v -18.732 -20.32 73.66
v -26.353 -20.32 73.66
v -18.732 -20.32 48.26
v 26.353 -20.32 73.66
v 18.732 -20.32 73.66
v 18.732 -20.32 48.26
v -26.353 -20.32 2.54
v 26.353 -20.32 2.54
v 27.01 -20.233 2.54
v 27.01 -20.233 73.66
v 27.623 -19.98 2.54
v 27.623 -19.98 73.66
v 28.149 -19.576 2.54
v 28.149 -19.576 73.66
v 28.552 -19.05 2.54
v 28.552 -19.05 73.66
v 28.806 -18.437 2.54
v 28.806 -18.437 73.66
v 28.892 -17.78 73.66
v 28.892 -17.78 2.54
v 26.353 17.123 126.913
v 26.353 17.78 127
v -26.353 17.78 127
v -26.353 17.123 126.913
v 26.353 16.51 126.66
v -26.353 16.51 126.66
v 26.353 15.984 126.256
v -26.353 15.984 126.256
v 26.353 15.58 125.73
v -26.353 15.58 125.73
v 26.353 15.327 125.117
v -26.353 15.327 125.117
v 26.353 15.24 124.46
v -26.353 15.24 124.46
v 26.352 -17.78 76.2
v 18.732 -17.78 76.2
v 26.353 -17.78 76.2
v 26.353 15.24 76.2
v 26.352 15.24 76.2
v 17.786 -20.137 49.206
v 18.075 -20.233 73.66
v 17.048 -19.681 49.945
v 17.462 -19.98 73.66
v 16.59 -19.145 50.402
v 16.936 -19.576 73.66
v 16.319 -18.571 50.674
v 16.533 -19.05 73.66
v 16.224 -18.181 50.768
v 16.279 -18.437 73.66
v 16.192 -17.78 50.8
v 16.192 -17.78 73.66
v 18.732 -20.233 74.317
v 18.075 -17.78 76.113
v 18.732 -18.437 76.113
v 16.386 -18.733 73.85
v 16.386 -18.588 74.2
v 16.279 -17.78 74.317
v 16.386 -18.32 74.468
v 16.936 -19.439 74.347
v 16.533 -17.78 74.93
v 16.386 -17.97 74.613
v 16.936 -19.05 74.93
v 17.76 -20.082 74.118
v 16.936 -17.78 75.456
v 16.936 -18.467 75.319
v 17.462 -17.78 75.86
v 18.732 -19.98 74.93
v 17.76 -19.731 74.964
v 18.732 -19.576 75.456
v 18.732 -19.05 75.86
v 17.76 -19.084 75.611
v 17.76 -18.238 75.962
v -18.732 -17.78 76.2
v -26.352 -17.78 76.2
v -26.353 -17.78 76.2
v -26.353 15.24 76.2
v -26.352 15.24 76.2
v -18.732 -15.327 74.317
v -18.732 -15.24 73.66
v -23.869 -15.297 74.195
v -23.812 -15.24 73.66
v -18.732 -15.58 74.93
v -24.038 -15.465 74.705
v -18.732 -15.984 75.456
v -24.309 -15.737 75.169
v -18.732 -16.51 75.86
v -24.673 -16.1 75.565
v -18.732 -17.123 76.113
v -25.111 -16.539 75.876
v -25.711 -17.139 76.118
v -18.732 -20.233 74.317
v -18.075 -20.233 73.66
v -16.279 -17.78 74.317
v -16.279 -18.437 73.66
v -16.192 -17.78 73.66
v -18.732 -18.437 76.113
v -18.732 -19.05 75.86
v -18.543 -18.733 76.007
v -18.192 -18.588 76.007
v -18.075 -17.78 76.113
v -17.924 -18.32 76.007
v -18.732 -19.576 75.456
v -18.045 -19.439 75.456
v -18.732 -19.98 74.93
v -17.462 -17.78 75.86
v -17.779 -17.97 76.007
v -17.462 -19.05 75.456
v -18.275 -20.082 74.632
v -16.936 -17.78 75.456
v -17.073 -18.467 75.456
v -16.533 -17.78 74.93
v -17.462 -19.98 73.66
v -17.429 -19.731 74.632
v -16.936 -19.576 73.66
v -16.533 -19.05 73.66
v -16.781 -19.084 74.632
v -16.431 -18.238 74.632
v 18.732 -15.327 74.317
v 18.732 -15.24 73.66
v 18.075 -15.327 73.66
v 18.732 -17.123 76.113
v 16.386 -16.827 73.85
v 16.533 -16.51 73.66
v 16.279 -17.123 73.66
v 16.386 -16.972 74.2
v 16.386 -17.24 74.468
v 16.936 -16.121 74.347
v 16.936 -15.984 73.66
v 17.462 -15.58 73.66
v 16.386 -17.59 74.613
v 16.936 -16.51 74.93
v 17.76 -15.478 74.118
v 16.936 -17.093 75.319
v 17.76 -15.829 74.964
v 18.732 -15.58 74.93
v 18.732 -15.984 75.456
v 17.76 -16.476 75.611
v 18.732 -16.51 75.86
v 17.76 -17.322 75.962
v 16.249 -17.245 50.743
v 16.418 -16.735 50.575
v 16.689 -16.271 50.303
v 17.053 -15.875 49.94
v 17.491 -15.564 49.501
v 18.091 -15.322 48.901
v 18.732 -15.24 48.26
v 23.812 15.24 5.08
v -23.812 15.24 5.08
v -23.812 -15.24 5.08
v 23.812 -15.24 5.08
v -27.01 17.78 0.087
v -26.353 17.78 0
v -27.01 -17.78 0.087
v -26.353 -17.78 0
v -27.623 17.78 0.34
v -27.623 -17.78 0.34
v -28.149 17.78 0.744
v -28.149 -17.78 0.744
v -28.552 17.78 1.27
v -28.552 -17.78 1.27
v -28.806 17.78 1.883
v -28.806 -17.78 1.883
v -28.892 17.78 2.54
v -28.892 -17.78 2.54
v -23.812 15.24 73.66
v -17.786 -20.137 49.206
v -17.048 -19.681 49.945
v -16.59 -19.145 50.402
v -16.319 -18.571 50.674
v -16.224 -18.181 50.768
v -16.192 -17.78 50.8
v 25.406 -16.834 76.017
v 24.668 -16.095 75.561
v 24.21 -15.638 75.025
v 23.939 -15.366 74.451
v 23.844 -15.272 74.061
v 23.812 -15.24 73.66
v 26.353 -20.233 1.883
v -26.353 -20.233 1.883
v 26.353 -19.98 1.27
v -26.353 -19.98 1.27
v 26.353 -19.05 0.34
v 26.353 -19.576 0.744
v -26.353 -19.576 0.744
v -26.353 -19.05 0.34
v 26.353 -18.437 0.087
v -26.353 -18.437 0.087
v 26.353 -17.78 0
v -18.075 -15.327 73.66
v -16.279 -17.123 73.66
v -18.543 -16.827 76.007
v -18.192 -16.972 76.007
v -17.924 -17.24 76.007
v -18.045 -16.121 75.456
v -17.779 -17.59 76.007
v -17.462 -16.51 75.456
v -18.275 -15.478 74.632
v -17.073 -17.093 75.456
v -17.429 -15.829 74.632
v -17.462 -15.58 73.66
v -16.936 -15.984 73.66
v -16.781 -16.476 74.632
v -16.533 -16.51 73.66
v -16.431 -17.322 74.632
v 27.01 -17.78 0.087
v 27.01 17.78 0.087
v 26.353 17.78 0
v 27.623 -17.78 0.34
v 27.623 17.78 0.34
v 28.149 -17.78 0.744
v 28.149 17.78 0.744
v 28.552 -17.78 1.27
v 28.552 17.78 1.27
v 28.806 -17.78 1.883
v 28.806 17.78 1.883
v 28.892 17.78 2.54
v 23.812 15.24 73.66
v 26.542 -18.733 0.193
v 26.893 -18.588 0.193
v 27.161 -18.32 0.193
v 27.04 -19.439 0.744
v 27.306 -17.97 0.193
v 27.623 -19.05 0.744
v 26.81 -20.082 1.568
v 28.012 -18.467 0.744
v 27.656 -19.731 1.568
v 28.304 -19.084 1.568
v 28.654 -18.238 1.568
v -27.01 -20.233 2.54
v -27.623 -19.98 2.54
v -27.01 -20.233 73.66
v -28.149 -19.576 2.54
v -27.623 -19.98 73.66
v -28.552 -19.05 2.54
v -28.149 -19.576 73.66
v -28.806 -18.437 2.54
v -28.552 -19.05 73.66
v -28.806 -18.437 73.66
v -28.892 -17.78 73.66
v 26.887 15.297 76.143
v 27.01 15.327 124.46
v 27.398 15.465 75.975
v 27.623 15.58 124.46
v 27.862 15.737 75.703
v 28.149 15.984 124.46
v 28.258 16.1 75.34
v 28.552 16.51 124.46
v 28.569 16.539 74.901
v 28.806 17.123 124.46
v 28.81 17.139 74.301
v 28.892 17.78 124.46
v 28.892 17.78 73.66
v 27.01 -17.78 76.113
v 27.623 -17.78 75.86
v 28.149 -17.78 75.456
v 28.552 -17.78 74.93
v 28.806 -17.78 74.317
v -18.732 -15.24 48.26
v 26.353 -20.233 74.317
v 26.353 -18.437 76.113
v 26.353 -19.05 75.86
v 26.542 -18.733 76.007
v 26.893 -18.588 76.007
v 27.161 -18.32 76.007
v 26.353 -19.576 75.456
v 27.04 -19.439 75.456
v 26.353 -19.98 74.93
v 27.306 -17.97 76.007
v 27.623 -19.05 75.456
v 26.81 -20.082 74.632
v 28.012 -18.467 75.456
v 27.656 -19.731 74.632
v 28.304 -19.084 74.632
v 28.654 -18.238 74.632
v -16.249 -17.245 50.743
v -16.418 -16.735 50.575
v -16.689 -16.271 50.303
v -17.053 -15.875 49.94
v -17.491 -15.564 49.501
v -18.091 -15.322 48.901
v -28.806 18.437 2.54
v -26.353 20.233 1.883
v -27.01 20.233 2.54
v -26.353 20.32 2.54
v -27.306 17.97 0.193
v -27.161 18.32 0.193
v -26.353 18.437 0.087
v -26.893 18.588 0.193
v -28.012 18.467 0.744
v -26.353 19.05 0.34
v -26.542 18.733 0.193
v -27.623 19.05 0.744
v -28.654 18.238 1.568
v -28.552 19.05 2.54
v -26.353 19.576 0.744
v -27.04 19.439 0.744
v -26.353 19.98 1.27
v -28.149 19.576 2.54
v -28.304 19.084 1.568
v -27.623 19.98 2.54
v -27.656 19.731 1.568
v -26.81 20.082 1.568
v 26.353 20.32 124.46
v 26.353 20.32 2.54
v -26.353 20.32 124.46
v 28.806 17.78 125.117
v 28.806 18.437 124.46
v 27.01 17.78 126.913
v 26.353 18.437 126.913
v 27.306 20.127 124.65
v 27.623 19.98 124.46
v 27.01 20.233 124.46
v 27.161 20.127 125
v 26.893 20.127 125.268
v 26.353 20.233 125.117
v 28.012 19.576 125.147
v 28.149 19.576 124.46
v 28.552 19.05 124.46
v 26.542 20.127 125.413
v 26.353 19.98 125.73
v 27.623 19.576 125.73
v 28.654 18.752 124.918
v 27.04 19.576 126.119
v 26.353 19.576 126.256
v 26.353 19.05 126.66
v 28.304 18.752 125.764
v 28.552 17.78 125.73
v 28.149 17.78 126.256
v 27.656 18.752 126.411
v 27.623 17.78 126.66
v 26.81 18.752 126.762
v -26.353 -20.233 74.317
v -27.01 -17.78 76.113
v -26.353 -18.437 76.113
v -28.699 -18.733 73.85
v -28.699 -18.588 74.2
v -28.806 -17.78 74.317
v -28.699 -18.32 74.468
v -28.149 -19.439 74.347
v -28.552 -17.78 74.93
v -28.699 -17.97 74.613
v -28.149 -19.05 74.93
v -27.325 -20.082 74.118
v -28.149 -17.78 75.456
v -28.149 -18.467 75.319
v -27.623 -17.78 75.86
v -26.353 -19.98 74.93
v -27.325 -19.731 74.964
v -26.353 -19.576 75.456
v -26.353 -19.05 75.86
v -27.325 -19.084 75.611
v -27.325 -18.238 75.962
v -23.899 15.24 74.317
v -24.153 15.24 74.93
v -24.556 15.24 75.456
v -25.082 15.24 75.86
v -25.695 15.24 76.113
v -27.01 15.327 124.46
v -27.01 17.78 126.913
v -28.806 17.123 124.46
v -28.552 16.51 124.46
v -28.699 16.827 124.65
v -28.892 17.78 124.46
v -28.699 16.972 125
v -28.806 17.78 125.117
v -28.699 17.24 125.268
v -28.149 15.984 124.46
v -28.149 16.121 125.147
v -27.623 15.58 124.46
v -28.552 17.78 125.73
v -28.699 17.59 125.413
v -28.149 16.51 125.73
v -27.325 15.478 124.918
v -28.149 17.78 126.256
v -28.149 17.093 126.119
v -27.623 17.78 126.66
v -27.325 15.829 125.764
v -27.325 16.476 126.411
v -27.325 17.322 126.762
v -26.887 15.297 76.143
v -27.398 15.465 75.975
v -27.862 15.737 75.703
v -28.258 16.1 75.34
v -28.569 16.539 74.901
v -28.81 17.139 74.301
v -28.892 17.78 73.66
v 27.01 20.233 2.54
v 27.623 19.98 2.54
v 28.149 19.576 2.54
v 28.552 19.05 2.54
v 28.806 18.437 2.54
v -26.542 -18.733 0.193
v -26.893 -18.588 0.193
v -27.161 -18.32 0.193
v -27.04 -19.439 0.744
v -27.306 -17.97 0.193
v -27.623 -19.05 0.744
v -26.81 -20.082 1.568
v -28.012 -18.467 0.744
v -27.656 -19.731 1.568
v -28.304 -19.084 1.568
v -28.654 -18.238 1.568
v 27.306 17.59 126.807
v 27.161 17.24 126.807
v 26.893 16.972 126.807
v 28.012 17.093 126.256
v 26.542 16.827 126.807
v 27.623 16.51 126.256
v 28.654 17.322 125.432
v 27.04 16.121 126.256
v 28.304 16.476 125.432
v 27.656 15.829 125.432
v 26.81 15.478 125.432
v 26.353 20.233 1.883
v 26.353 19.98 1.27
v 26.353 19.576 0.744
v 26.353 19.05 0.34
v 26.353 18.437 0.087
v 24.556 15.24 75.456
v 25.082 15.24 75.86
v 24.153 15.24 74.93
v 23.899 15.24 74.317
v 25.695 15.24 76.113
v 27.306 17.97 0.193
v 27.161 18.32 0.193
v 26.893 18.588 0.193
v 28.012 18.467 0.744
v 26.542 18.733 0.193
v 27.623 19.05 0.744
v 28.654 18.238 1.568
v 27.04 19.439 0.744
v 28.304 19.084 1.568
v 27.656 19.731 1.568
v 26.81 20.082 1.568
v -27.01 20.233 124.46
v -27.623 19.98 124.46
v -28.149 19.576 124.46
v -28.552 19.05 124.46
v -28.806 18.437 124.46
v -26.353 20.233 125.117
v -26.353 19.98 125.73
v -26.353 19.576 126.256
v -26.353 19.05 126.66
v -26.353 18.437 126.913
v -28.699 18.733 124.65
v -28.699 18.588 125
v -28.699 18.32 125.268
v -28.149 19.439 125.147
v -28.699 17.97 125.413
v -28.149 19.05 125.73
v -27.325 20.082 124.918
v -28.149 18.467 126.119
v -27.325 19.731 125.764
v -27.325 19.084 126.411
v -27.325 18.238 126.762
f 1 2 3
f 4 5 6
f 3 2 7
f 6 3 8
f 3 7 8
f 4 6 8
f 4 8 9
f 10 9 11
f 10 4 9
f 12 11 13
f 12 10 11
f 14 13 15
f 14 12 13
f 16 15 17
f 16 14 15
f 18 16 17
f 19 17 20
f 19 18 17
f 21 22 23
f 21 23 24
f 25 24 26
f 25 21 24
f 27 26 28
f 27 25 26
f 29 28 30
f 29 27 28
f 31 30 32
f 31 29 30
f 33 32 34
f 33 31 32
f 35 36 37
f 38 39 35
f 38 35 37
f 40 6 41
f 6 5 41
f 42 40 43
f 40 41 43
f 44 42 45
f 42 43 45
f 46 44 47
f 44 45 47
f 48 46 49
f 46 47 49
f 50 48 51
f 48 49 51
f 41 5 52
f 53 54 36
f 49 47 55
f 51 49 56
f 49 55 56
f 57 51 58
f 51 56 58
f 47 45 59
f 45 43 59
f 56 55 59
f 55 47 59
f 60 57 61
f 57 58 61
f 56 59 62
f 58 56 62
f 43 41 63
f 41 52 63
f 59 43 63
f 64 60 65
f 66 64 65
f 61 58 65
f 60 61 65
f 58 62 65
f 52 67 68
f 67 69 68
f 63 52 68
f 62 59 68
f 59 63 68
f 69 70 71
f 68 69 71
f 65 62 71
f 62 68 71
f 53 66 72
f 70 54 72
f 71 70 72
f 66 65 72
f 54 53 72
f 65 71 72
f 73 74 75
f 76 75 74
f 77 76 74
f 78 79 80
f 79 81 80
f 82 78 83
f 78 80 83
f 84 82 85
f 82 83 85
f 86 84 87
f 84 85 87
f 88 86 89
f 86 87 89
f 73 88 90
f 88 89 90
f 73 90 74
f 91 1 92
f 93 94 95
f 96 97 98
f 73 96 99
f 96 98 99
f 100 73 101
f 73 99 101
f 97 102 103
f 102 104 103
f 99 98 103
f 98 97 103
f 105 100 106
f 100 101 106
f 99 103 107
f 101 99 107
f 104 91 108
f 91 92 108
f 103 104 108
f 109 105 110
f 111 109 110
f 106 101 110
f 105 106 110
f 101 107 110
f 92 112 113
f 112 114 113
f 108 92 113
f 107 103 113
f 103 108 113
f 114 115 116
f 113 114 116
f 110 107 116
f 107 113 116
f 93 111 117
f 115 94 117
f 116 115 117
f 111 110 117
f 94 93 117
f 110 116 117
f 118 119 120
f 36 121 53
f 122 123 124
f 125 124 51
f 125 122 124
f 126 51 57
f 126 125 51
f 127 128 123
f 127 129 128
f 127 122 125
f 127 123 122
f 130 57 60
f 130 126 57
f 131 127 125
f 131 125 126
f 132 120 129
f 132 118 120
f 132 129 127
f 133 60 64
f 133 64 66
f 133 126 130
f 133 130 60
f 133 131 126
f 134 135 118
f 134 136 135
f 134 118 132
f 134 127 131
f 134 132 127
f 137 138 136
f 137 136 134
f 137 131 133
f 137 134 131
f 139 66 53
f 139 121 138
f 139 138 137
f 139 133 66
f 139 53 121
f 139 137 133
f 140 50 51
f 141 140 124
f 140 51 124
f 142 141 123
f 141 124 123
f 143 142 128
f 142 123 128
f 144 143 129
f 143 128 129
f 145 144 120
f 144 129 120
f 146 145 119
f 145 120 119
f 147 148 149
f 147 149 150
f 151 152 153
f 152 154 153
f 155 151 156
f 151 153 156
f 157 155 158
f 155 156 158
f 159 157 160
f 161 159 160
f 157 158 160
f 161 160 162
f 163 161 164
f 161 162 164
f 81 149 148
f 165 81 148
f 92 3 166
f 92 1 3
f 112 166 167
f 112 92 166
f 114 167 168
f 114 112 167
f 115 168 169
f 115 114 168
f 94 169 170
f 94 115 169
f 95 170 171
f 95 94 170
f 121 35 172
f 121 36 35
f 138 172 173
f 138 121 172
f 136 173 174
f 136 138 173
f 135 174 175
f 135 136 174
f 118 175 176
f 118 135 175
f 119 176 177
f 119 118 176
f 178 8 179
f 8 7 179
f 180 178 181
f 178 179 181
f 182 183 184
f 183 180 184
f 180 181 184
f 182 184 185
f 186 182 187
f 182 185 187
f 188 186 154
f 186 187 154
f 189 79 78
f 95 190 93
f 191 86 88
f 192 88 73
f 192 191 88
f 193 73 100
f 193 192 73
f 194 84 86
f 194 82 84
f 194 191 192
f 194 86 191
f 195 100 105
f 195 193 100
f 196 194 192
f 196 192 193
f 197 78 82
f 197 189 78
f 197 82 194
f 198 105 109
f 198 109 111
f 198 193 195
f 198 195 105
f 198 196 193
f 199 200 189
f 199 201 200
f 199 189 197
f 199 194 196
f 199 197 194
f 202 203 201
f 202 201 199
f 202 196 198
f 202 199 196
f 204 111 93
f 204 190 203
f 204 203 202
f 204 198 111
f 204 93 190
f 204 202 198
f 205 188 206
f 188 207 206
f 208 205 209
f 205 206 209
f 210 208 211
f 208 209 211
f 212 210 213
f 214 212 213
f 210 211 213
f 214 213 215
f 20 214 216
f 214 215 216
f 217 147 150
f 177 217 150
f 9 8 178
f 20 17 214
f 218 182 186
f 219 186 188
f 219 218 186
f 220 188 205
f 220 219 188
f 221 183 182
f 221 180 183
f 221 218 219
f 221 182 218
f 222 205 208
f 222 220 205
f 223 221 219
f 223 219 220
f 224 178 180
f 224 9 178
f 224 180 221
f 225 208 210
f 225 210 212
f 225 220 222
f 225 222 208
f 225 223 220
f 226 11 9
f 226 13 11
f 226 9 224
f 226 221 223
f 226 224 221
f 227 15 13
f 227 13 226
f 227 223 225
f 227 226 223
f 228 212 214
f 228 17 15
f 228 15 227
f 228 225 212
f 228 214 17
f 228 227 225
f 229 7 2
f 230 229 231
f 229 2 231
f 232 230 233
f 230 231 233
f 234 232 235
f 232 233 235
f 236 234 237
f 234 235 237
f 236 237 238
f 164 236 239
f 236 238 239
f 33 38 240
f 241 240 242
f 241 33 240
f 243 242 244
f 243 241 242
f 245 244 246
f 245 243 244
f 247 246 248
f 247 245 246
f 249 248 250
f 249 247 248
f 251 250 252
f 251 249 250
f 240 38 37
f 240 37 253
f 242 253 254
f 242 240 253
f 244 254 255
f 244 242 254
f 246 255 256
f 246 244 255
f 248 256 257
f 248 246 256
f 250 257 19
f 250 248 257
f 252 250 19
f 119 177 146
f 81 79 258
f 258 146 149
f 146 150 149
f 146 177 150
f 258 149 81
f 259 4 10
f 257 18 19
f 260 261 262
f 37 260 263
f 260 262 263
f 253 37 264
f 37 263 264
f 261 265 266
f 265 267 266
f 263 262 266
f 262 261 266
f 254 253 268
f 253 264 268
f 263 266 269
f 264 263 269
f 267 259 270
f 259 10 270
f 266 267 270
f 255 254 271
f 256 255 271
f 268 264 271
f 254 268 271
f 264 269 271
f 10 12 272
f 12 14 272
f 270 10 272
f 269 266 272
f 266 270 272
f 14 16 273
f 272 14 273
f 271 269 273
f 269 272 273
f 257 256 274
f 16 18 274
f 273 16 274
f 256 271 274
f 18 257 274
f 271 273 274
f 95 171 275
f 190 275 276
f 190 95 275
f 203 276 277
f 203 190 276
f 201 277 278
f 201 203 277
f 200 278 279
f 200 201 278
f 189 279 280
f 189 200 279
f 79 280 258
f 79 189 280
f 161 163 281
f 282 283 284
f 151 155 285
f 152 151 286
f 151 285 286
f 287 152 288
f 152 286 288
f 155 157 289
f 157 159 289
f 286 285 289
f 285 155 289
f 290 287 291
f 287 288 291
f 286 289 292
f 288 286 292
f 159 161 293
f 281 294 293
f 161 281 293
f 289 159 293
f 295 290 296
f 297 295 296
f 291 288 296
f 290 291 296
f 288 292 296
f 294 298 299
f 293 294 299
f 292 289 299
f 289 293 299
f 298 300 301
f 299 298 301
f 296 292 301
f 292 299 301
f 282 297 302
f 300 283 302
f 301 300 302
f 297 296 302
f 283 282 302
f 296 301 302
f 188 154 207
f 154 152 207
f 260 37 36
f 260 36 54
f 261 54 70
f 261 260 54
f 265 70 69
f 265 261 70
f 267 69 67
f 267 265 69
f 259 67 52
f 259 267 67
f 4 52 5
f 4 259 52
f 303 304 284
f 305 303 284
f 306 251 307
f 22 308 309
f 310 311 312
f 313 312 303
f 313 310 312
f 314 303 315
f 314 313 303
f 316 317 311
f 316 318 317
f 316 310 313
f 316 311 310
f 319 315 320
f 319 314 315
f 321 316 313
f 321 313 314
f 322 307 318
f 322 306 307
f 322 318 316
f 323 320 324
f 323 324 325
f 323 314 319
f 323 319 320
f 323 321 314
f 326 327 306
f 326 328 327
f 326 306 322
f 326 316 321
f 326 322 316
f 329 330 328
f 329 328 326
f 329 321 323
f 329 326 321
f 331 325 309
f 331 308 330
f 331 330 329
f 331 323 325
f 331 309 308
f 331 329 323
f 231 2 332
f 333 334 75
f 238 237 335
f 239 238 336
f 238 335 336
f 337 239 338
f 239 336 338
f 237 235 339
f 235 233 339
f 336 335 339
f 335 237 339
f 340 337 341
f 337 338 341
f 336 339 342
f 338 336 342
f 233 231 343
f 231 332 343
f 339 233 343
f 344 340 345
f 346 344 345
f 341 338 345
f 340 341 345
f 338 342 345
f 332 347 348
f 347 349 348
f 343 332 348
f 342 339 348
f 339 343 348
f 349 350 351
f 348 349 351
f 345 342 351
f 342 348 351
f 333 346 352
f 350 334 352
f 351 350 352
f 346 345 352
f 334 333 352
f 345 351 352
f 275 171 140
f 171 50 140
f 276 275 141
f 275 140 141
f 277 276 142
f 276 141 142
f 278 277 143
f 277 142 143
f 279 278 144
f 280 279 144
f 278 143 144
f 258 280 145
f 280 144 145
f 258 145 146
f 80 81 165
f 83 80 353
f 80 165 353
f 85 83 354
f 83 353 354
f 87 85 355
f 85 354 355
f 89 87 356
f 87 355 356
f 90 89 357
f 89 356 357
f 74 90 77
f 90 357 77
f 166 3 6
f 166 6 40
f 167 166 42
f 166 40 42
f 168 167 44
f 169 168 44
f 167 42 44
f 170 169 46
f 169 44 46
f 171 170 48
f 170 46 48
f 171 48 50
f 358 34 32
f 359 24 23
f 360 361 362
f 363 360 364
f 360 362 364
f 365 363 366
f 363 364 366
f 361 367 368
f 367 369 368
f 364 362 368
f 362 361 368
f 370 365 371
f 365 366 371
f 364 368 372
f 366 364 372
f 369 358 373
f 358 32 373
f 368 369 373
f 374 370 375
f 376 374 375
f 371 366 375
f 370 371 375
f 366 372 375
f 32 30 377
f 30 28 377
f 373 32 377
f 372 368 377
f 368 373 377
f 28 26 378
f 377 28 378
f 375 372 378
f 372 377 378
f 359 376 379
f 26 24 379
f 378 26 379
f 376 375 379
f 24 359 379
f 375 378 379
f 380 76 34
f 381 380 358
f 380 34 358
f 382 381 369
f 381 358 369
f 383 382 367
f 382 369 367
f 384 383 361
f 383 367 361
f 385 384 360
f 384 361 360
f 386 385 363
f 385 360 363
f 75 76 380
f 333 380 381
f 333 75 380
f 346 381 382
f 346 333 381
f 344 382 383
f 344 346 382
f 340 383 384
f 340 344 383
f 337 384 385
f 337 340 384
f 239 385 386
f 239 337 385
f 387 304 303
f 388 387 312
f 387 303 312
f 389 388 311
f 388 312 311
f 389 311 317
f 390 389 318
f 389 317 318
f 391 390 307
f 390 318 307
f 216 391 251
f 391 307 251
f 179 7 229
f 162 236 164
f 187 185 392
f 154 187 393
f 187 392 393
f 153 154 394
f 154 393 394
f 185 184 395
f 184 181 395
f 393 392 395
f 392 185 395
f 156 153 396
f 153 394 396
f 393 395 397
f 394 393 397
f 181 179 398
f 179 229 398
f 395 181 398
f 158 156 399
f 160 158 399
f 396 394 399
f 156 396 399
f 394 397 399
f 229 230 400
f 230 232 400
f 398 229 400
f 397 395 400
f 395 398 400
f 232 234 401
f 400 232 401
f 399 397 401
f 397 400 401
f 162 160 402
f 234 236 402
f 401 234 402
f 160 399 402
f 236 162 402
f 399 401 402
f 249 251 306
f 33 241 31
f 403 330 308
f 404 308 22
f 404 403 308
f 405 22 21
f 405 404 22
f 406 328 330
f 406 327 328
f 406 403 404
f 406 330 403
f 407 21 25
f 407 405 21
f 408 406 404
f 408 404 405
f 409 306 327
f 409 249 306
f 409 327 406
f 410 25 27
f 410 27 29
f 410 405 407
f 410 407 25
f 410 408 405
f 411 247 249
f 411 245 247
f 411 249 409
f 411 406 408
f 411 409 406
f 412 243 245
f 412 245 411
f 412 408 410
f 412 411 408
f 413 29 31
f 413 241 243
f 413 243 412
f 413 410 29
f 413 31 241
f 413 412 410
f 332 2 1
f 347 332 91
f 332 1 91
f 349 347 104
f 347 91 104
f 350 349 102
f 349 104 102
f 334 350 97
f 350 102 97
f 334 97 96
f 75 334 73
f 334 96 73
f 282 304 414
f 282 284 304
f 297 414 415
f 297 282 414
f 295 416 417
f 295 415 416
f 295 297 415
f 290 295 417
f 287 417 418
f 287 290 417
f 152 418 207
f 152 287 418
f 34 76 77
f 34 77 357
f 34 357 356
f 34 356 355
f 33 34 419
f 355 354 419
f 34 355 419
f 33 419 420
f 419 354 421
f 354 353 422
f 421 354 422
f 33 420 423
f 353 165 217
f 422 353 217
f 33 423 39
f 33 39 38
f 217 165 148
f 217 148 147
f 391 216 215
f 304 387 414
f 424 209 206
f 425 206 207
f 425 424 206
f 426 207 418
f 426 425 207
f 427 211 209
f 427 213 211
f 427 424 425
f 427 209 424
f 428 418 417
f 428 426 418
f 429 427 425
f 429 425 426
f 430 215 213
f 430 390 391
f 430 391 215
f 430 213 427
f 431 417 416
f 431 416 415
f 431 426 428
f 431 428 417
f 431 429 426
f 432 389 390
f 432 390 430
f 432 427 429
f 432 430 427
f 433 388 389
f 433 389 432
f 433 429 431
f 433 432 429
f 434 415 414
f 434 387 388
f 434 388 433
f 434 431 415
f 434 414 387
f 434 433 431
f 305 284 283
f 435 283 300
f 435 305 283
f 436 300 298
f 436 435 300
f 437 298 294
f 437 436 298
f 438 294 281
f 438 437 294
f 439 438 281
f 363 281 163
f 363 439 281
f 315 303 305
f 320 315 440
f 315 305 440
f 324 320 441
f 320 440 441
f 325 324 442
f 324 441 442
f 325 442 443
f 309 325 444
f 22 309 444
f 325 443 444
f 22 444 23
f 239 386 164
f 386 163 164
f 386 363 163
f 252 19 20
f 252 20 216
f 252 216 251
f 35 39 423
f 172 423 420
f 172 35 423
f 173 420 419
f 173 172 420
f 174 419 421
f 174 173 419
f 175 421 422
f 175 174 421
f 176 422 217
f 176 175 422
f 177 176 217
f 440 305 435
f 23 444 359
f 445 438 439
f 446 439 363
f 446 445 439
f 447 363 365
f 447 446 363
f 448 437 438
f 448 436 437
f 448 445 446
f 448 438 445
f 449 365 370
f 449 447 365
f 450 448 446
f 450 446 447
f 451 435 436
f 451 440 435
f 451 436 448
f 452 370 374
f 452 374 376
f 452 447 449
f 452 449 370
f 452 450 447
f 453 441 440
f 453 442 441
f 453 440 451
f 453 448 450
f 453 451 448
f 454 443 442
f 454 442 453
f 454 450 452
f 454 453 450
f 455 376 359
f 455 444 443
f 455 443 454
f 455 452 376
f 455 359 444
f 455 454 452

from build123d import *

# Parameters (mm, degrees)
F1_DEPTH = 5.08
F0_W     = 32.385
F0_H     = 5.08
F2_DEPTH = 50.8
F3_DEPTH = 76.2
F4_DEPTH = 127
F5_R     = 2.53999


# Not quite as in the source:
# - a fillet or chamfer is up to 0.001 mm smaller than in the source, because OpenCascade refuses the exact size


with BuildPart() as f1:
    # F0 (on Top) → F1 (new body)
    with BuildSketch(Plane.XY):
        Polygon((23.8125, 15.24), (-23.8125, 15.24), (-23.8125, -15.24), (-16.1925, -15.24), (16.1925, -15.24), (23.8125, -15.24), align=None)
    extrude(amount=F1_DEPTH)

    # F0 (on Top) → F2 (join)
    with BuildSketch(Plane.XY):
        with Locations((0, -17.78)):
            Rectangle(F0_W, F0_H)
    extrude(amount=F2_DEPTH)

    # F0 (on Top) → F3 (join)
    with BuildSketch(Plane.XY):
        Polygon((-23.8125, 15.24), (-28.8925, 15.24), (-28.8925, -20.32), (-16.1925, -20.32), (-16.1925, -15.24), (-23.8125, -15.24), align=None)
        Polygon((28.8925, -20.32), (28.8925, 15.24), (23.8125, 15.24), (23.8125, -15.24), (16.1925, -15.24), (16.1925, -20.32), align=None)
    extrude(amount=F3_DEPTH)

    # F0 (on Top) → F4 (join)
    with BuildSketch(Plane.XY):
        Polygon((28.8925, 20.32), (-28.8925, 20.32), (-28.8925, 15.24), (-23.8125, 15.24), (23.8125, 15.24), (28.8925, 15.24), align=None)
    extrude(amount=F4_DEPTH)

    # F5 (radius 2.54 in the source; OpenCascade refuses exactly that, so slightly less here)
    f5_edges = [f1.edges().sort_by_distance(p)[0] for p in [
        (28.8925, -20.32, 38.1),
        (22.5425, -20.32, 76.2),
        (16.1925, -20.32, 63.5),
        (0, -20.32, 50.8),
        (-16.1925, -20.32, 63.5),
        (-22.5425, -20.32, 76.2),
        (-28.8925, -20.32, 38.1),
        (0, -20.32, 0),
        (-16.1925, -15.24, 63.5),
        (0, -15.24, 50.8),
        (-20.0025, -15.24, 76.2),
        (20.0025, -15.24, 76.2),
        (16.1925, -15.24, 63.5),
        (16.1925, -17.78, 76.2),
        (-16.1925, -17.78, 76.2),
        (23.8125, 0, 76.2),
        (-23.8125, 0, 76.2),
        (28.8925, -2.54, 76.2),
        (28.8925, 15.24, 101.6),
        (28.8925, 17.78, 127),
        (28.8925, 20.32, 63.5),
        (28.8925, 0, 0),
        (0, 15.24, 127),
        (-28.8925, 15.24, 101.6),
        (0, 20.32, 127),
        (-28.8925, 20.32, 63.5),
        (-28.8925, -2.54, 76.2),
        (-28.8925, 0, 0),
        (0, 20.32, 0),
        (-28.8925, 17.78, 127),
    ]]
    fillet(f5_edges, radius=F5_R)


solid = f1.part
